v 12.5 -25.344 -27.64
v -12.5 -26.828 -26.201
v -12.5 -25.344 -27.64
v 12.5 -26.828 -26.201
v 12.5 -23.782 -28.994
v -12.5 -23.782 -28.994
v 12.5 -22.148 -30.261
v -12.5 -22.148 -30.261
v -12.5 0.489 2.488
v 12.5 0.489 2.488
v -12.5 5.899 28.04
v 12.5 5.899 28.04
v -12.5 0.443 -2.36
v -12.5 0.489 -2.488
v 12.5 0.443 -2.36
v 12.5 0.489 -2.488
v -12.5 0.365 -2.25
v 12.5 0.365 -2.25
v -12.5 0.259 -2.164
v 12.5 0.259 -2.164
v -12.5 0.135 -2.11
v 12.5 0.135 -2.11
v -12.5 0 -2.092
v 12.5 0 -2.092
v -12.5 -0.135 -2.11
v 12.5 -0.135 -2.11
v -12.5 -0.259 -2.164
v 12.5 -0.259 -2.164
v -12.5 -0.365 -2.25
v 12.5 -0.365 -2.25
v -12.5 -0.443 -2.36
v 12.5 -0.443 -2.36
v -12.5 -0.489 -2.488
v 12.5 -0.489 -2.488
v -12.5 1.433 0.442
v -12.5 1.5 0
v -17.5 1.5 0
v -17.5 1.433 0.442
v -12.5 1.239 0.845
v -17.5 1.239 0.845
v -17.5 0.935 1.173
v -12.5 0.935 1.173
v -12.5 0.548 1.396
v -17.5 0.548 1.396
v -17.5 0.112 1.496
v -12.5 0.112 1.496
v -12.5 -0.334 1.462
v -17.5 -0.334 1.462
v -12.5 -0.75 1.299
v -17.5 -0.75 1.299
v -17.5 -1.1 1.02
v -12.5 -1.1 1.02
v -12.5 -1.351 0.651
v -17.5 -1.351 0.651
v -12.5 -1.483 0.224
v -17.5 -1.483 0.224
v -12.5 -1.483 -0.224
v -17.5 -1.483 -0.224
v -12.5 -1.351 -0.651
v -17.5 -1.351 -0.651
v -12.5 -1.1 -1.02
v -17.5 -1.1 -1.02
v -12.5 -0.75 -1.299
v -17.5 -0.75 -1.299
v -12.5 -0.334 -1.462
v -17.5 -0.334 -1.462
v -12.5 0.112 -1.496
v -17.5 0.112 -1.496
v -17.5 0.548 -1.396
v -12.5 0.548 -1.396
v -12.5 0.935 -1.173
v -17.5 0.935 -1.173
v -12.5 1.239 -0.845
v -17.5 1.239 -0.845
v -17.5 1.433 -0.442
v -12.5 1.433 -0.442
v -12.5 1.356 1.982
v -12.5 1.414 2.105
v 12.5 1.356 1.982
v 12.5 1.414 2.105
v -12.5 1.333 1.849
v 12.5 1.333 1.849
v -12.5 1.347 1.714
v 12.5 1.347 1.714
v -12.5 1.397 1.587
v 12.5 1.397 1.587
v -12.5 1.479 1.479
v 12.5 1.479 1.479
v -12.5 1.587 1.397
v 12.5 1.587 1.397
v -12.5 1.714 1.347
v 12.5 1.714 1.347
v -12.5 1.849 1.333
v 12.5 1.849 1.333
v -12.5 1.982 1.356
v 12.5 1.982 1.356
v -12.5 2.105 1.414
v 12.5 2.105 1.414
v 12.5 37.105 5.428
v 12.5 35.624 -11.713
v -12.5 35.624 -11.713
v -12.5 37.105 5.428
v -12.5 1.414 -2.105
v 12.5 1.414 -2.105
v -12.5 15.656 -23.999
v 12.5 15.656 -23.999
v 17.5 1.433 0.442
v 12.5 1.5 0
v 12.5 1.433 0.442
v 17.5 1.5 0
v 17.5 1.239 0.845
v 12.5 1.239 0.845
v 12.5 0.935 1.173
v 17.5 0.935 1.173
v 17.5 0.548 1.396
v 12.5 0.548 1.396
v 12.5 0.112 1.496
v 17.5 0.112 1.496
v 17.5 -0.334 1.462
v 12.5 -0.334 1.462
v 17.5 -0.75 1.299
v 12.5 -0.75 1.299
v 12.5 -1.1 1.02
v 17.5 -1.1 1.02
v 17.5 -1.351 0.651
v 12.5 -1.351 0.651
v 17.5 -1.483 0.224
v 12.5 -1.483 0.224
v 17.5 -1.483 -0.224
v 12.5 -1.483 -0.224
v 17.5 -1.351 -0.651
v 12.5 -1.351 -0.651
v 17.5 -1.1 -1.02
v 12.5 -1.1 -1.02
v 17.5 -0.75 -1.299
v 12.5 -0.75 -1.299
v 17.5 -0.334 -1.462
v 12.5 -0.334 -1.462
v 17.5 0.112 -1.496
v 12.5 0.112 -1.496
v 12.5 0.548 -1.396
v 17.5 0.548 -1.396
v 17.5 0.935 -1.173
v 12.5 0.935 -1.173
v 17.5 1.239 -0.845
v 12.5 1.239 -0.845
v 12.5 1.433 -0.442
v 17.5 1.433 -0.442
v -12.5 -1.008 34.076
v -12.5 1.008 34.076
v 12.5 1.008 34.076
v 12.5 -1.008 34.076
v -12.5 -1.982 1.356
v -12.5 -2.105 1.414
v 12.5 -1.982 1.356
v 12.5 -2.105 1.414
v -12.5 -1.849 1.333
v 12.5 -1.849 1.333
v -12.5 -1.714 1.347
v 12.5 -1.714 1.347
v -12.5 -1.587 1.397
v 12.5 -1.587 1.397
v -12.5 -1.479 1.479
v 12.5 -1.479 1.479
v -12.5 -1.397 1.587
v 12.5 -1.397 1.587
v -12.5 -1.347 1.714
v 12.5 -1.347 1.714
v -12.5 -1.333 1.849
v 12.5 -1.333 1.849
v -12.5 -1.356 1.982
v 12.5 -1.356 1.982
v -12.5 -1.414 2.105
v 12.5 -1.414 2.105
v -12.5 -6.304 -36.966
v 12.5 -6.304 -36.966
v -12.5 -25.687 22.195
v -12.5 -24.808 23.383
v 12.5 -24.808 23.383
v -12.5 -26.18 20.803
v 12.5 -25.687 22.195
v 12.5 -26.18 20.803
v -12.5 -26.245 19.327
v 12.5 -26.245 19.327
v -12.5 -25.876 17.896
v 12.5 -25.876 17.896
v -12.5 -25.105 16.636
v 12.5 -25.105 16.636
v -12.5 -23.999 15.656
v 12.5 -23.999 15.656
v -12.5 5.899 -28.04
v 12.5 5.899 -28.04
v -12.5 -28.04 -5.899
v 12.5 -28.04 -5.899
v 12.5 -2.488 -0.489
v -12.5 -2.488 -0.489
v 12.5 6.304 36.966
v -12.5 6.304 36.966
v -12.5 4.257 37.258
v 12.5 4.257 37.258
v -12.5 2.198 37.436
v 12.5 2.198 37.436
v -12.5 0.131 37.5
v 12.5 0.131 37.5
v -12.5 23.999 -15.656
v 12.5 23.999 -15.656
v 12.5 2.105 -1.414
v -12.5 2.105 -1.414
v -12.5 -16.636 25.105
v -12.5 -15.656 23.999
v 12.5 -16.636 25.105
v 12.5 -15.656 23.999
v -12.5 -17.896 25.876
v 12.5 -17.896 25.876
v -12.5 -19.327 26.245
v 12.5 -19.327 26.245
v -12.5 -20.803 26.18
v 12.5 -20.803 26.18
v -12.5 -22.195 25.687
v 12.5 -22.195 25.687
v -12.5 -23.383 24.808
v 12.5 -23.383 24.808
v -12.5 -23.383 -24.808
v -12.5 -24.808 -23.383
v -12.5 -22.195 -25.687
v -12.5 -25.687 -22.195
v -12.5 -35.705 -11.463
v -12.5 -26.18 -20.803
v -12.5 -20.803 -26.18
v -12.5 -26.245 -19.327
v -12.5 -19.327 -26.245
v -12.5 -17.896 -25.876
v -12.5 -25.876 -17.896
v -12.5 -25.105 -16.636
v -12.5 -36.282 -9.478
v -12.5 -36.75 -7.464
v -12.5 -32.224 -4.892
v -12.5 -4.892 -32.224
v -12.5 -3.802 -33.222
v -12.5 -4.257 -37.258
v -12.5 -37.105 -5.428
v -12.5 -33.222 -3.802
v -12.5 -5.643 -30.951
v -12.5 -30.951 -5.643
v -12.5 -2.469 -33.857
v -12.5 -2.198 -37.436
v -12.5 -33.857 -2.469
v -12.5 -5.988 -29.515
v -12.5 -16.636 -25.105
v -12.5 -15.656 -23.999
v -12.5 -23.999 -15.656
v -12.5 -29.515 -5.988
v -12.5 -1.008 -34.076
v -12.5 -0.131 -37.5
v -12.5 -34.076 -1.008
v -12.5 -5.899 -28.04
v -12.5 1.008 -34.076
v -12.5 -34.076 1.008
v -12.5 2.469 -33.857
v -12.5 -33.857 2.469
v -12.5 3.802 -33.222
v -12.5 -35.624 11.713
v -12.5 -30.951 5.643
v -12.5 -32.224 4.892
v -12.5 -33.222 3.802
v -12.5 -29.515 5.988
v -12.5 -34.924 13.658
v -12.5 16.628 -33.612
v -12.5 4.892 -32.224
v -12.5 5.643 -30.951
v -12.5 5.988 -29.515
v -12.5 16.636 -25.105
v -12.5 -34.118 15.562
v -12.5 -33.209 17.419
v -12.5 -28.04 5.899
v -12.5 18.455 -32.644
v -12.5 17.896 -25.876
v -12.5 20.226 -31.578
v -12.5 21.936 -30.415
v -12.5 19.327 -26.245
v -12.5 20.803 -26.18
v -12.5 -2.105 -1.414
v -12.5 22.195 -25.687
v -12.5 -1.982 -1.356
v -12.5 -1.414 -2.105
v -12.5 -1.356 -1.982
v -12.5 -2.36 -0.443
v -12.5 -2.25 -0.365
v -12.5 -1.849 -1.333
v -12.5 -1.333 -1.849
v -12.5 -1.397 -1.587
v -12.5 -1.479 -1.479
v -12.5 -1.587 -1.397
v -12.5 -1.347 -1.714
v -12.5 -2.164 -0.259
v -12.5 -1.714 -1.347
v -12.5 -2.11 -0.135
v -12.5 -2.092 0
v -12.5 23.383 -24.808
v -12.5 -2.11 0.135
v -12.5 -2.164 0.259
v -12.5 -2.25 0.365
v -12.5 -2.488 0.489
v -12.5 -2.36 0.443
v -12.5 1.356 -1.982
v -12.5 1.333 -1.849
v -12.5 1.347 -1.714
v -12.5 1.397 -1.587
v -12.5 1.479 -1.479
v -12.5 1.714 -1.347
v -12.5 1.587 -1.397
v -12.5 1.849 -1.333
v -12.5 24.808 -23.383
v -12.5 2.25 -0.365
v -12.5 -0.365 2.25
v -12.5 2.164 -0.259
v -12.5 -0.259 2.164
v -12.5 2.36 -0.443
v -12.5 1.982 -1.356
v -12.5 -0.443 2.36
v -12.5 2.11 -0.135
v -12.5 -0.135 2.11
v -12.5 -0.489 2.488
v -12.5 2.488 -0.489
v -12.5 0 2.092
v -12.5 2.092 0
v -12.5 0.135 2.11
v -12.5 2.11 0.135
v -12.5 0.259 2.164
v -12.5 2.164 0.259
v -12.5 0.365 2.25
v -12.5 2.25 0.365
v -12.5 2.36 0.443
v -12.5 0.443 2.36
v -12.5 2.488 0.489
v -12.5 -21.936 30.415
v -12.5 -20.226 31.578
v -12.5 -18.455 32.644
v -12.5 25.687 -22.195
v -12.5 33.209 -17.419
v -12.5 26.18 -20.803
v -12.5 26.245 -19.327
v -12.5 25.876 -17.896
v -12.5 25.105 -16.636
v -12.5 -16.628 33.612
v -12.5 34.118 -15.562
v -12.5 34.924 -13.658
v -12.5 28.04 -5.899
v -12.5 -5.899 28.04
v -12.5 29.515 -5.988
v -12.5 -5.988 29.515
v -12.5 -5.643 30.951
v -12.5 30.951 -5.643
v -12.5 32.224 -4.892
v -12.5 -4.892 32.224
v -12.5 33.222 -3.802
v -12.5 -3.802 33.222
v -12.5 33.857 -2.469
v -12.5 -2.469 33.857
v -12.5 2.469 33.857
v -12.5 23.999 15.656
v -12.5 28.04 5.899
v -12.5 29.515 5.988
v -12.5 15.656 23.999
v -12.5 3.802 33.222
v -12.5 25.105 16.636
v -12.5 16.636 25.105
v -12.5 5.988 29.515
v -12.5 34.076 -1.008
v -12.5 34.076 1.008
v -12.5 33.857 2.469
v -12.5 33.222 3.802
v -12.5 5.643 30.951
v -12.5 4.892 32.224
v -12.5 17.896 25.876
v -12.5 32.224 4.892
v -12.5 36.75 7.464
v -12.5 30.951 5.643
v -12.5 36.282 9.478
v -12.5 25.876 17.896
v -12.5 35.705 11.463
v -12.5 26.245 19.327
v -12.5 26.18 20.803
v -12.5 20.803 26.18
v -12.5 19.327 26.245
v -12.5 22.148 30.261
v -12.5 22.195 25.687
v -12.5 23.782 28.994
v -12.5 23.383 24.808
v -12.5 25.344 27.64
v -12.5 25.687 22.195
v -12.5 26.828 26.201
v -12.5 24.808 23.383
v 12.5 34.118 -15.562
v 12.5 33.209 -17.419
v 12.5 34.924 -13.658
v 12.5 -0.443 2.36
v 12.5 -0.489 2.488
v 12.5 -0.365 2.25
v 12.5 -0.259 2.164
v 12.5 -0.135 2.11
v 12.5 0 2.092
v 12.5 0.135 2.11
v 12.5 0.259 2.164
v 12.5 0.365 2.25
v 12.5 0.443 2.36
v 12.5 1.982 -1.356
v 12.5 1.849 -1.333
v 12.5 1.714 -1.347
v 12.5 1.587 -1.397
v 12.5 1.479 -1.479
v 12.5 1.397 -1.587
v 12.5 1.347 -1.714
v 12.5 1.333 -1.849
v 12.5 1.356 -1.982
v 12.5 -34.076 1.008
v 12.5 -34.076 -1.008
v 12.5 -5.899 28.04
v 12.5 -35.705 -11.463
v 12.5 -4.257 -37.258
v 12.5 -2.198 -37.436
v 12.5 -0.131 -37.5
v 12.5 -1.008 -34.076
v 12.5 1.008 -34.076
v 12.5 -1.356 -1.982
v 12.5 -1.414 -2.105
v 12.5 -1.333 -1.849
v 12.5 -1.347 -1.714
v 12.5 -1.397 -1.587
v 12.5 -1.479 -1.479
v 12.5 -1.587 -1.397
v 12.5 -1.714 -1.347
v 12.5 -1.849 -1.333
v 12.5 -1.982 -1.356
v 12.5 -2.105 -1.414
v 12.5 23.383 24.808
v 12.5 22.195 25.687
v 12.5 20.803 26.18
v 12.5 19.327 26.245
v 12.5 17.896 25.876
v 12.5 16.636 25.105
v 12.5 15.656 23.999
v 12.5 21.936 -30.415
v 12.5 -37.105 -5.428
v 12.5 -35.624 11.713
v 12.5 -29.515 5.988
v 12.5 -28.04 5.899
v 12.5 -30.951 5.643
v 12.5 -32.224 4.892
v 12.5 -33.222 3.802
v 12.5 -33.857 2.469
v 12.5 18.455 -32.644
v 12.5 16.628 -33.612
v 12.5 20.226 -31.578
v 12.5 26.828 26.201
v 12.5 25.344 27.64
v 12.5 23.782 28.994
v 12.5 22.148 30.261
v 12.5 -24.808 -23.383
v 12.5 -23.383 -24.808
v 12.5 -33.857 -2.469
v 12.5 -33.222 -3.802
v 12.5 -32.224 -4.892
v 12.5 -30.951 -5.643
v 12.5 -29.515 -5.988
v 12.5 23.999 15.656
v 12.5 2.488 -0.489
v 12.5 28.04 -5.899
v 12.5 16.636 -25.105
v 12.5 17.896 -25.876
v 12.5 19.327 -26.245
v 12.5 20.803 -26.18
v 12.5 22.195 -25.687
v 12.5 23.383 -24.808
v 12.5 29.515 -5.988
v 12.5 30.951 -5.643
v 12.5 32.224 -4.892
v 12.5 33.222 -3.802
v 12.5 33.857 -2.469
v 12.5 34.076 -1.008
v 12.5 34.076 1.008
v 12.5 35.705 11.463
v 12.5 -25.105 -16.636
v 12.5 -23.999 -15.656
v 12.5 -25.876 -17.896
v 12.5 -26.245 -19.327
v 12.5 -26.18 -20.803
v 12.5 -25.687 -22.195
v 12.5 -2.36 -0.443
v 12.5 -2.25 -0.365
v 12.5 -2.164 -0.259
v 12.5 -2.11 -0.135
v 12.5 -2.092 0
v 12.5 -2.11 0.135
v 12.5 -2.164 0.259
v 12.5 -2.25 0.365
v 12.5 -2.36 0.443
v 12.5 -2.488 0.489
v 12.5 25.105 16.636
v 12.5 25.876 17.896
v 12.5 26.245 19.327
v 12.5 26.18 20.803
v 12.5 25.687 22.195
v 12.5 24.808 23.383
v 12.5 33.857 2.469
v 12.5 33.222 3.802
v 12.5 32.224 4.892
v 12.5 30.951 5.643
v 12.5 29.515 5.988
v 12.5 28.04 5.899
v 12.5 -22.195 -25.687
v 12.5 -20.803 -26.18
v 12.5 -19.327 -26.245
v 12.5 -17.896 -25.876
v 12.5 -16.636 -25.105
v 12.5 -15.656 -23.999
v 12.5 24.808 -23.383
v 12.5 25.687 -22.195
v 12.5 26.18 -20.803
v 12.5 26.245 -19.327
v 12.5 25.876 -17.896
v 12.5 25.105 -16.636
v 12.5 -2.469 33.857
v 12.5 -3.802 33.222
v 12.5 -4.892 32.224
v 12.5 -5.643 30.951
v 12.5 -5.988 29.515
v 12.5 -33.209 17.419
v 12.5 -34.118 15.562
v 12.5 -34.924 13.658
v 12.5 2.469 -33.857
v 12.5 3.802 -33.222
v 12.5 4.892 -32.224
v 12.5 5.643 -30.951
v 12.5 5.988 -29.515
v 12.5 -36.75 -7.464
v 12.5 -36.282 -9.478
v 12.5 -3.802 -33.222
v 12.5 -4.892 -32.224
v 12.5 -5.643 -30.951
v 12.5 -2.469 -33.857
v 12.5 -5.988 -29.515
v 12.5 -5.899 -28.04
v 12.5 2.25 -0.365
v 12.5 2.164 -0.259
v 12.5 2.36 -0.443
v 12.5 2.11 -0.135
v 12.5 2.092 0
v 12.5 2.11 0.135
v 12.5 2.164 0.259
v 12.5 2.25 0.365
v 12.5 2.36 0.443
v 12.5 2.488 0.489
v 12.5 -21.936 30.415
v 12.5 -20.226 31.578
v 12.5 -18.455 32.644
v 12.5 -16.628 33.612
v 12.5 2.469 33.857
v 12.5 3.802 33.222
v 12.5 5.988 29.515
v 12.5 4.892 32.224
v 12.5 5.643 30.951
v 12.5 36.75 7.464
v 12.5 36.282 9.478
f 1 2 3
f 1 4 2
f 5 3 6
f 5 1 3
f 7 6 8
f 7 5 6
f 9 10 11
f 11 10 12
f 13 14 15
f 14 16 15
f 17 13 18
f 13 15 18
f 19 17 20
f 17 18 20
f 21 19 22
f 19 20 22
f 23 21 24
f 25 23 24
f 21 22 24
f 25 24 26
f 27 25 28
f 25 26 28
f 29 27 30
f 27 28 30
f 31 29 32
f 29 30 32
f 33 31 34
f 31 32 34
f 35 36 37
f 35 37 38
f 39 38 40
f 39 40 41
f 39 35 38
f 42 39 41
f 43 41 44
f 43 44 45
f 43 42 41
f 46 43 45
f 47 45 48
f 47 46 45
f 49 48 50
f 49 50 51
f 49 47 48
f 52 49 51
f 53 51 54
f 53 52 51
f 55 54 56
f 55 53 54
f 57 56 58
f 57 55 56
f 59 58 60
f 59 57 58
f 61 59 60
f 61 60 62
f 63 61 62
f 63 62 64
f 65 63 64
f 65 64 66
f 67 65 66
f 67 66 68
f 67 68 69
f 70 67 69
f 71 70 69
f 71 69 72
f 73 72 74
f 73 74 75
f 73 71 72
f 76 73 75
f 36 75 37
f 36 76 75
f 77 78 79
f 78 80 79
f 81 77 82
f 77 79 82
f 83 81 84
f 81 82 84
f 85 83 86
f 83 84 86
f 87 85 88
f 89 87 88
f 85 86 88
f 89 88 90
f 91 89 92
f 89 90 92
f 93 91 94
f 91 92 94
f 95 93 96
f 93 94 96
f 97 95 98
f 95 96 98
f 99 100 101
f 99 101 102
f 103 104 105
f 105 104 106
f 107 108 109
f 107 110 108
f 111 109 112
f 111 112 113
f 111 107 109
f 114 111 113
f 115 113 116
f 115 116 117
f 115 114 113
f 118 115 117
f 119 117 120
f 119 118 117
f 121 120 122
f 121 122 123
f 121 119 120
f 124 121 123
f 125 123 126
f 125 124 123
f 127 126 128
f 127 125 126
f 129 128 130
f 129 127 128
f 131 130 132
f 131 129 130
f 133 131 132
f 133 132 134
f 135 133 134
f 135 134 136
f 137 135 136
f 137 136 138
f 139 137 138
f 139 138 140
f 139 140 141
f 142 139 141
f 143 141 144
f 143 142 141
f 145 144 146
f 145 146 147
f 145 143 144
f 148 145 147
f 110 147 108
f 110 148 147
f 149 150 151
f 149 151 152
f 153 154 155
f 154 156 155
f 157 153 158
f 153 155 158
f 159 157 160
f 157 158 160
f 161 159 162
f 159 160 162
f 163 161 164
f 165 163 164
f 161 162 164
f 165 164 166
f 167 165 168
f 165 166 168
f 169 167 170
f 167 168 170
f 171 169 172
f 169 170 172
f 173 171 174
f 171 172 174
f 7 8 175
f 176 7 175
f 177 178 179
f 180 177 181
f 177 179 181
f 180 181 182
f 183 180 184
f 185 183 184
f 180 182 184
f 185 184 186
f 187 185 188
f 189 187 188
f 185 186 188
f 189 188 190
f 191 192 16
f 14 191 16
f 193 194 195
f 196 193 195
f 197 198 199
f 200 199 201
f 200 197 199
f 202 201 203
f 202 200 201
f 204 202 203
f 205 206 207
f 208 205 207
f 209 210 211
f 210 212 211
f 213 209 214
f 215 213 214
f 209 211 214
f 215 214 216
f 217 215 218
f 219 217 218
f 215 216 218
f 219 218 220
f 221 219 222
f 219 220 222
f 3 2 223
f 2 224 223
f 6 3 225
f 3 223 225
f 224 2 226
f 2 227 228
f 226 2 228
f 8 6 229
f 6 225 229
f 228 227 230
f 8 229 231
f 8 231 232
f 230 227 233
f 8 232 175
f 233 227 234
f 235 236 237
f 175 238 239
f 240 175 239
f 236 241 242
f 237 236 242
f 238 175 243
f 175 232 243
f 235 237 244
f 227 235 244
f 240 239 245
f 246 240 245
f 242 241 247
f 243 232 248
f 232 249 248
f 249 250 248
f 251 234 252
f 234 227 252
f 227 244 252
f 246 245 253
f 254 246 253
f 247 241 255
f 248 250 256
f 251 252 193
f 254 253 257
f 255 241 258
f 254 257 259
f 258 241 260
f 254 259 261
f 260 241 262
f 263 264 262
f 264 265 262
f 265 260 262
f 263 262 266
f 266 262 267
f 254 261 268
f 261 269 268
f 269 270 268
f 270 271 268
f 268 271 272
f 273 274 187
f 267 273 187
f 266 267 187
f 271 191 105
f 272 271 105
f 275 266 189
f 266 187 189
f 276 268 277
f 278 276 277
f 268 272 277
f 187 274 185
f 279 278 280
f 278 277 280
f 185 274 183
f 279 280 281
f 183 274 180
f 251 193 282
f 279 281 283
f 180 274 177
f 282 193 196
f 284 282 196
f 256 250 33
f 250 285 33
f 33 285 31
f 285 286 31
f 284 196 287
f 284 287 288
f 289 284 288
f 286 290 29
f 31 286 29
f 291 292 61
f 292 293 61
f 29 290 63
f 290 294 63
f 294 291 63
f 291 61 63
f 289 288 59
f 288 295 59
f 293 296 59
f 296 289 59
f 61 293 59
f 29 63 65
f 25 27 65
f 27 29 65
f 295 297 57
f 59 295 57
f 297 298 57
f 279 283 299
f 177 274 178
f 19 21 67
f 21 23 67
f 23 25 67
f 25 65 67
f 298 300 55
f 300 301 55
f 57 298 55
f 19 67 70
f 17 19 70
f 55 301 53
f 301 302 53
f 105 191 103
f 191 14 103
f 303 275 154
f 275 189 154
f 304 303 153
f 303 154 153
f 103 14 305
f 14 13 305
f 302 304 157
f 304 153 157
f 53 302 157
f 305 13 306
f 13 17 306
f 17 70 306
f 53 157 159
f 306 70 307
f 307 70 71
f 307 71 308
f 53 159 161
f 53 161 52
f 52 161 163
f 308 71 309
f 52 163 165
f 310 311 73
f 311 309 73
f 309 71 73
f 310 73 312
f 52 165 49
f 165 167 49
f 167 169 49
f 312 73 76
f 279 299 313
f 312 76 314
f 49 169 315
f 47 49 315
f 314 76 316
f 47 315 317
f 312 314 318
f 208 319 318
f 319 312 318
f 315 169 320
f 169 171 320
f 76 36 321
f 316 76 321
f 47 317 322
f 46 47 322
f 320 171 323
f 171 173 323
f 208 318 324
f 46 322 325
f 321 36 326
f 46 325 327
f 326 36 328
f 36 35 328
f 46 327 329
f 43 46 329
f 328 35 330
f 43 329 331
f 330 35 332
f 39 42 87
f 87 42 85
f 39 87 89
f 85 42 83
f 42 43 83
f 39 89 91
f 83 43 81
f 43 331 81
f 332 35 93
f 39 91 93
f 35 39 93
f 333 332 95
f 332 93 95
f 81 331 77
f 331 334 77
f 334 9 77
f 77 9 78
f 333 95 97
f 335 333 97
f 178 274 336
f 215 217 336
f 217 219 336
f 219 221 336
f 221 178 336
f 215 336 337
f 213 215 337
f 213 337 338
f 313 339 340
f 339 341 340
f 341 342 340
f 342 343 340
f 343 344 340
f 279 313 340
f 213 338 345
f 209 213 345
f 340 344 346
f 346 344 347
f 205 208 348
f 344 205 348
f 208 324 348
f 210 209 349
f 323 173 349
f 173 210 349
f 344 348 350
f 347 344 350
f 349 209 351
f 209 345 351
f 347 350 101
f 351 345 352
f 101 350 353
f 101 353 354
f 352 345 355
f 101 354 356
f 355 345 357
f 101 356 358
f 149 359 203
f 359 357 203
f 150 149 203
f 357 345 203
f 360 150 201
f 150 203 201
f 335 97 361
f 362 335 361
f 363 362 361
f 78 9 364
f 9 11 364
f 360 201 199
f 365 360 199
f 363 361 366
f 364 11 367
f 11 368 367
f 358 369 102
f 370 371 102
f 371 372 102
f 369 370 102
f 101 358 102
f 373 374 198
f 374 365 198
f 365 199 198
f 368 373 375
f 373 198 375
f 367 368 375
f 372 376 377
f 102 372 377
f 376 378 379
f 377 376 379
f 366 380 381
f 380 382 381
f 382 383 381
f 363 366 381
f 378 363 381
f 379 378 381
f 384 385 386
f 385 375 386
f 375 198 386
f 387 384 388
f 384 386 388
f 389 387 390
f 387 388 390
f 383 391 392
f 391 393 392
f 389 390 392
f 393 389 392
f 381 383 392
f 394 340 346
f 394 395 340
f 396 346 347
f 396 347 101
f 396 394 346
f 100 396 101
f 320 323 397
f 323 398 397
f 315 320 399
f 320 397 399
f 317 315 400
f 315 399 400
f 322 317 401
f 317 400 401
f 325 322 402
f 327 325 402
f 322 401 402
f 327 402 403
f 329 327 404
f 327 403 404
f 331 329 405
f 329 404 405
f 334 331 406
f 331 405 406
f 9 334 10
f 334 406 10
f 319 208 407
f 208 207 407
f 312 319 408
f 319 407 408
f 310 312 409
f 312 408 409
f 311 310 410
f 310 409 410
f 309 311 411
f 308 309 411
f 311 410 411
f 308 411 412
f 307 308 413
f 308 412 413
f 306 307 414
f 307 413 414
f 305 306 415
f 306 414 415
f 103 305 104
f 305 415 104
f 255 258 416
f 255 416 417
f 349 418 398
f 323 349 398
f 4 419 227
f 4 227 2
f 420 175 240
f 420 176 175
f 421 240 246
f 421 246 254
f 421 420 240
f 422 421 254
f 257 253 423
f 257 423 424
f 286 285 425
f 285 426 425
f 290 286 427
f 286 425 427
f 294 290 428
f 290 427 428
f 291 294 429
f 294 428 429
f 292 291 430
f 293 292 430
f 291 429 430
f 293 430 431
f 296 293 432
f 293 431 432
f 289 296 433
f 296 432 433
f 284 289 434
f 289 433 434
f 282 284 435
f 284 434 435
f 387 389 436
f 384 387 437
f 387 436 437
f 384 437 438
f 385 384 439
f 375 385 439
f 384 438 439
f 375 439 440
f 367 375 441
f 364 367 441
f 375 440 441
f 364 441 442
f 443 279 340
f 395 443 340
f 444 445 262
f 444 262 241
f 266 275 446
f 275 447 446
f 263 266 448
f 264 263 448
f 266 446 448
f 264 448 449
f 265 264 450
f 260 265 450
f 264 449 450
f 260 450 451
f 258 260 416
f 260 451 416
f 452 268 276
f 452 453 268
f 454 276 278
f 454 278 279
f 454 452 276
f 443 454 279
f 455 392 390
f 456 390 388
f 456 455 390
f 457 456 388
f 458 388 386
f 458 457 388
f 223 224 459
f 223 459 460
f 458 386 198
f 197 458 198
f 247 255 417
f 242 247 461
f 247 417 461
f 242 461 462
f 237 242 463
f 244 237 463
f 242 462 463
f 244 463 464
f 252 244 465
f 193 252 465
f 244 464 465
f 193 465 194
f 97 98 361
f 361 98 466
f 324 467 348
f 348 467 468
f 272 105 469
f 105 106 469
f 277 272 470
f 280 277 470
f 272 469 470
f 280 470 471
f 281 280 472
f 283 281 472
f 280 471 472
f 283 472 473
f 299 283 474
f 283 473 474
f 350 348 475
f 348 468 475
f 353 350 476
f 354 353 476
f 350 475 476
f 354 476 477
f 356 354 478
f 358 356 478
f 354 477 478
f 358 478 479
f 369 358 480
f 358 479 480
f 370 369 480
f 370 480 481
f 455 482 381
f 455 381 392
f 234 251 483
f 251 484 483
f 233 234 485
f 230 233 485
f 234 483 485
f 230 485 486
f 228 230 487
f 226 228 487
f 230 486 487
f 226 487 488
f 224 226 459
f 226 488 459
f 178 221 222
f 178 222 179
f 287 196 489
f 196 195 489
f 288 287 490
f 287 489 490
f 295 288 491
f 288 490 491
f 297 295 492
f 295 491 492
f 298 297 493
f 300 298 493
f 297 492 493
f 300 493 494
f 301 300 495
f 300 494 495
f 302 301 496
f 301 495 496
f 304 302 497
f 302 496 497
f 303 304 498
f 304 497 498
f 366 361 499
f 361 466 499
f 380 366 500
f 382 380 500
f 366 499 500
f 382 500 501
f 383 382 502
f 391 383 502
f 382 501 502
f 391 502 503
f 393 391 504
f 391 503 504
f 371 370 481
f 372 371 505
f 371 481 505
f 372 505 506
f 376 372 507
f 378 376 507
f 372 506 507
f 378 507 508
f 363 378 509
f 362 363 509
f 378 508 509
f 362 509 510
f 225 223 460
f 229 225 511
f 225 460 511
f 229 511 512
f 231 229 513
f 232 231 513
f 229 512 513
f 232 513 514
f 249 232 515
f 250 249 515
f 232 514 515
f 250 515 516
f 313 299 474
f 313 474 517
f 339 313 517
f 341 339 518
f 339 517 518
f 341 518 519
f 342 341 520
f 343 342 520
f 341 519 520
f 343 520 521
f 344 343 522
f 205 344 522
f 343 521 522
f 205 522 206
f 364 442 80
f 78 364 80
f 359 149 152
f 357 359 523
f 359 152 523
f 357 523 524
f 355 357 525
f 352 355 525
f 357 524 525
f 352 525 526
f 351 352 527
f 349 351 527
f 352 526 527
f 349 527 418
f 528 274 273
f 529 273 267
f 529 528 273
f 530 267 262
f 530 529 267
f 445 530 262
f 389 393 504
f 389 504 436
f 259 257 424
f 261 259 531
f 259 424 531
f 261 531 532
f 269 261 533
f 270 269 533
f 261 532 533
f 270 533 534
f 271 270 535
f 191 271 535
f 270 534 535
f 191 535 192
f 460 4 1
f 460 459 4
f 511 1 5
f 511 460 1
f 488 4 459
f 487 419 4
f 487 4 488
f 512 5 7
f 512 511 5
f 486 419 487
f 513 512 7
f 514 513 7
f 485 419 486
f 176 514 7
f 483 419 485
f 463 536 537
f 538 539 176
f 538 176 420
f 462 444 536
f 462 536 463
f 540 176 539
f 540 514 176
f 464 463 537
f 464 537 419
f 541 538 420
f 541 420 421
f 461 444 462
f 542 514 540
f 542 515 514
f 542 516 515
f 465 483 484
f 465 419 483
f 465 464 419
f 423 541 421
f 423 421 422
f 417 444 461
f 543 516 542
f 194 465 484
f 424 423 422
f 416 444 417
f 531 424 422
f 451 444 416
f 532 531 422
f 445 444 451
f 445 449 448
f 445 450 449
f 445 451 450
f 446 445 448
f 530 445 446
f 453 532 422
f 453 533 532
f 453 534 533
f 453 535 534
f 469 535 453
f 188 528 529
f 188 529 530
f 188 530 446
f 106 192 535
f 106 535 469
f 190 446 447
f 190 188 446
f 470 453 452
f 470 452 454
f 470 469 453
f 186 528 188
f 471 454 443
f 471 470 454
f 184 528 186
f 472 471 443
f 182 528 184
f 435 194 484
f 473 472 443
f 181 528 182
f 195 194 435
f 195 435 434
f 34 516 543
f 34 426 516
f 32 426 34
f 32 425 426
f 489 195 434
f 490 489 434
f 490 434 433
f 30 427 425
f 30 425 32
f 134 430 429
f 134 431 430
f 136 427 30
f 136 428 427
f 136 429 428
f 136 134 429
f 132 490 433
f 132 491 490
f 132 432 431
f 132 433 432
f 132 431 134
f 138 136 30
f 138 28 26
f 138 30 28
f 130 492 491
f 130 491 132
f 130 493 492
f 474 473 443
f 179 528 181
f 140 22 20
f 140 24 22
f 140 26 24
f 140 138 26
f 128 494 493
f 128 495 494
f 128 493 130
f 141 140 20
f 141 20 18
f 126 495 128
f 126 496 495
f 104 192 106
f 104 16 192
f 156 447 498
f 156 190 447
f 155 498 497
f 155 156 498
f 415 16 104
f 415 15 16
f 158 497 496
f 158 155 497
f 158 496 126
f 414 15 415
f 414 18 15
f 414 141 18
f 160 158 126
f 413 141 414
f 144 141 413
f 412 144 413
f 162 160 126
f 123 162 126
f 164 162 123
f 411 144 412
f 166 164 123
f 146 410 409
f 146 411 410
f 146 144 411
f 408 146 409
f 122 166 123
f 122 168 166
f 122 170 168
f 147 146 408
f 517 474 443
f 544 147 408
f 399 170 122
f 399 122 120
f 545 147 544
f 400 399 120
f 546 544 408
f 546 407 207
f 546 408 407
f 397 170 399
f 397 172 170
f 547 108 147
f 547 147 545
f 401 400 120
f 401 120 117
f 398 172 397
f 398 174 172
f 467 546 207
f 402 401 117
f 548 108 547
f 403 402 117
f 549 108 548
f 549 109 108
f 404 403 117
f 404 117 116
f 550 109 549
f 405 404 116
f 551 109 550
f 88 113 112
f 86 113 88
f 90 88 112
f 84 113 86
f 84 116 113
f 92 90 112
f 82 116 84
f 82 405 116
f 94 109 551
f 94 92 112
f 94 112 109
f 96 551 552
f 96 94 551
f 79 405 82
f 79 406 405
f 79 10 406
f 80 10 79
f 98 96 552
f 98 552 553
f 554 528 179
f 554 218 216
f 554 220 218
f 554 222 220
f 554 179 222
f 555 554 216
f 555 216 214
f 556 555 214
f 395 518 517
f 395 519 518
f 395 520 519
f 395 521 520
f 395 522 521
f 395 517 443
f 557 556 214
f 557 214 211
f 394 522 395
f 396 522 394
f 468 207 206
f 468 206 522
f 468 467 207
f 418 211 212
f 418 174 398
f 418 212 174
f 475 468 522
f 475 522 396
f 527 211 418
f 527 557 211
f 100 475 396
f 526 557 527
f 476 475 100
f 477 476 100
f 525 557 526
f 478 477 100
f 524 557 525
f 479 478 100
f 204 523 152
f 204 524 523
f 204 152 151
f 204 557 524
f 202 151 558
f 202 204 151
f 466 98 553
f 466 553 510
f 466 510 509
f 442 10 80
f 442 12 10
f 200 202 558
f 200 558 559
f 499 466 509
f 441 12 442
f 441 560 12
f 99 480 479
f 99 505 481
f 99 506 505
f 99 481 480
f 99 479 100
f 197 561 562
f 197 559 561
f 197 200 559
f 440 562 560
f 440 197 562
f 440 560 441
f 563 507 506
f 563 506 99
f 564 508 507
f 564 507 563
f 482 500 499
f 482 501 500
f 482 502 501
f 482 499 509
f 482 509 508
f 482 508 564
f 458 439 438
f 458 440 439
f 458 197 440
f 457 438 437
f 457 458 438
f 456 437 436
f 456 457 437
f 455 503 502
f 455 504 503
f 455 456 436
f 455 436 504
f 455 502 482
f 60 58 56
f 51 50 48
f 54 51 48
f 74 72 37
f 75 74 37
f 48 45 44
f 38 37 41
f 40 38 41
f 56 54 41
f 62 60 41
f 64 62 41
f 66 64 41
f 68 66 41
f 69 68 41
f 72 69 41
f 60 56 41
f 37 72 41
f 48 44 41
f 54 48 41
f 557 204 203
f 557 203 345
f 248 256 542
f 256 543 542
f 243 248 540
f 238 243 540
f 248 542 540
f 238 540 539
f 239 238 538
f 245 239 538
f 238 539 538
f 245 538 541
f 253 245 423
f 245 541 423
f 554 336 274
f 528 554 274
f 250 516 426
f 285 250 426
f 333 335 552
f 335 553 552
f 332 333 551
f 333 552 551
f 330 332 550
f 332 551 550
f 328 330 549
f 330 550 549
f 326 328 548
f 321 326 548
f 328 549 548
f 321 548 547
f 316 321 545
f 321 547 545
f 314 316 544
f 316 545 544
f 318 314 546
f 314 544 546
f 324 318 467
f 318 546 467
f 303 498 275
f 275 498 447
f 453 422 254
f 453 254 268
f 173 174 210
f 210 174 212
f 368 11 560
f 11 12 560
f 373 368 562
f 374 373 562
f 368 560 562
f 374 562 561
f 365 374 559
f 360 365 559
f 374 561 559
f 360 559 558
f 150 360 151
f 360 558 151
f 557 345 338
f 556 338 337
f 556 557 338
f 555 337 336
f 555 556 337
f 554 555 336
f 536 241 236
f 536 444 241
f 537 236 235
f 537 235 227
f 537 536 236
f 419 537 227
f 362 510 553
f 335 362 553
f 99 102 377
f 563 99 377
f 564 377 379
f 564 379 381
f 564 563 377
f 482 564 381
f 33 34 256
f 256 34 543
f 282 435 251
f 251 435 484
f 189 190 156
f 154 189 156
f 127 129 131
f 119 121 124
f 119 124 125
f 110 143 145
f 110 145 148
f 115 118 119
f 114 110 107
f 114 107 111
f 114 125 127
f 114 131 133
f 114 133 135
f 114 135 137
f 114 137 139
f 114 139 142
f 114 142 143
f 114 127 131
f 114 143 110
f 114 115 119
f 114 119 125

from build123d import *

# Parameters (mm, degrees)
F0_R     = 37.5
F1_DEPTH = 12.5
F3_DEPTH = 12.5
F4_COUNT = 8
F6_DEPTH = 12.5
F7_R     = 1.5
F8_DEPTH = 17.5


with BuildPart() as f1:
    # F0 (on Right) → F1 (new body, symmetric)
    with BuildSketch(Plane.YZ):
        Circle(F0_R)
    extrude(amount=F1_DEPTH, both=True)

    # F2 (on Right) → F3 (cut, symmetric)
    with BuildSketch(Plane.YZ):
        with BuildLine():
            ThreePointArc((5.8991823905, 28.0400841101), (4.892101729, 32.223904361), (1.0076208802, 34.075760696))
            Line((1.0076208802, 34.075760696), (-1.0076208802, 34.075760696))
            ThreePointArc((-1.0076208802, 34.075760696), (-4.892101729, 32.223904361), (-5.8991823905, 28.0400841101))
            Line((-5.8991823905, 28.0400841101), (-0.489156151, 2.4882115641))
            ThreePointArc((-0.489156151, 2.4882115641), (0, 2.0917792227), (0.489156151, 2.4882115641))
            Line((0.489156151, 2.4882115641), (5.8991823905, 28.0400841101))
        make_face()
    f3 = extrude(amount=F3_DEPTH, both=True, mode=Mode.SUBTRACT)

    # F4: F3 ×8 about axis
    f4_axis = Axis((12.5, 0, 0), (1, 0, 0))
    for i in range(1, F4_COUNT):
        add(f3.rotate(f4_axis, i * 360 / F4_COUNT), mode=Mode.SUBTRACT)

    # F5 (on Right) → F6 (intersect, symmetric)
    with BuildSketch(Plane.YZ):
        Polygon((37.3855511828, 8.6729428424), (25.1477183542, 28.9912337848), (3.3043118538, 38.2358587972), (-19.8012294653, 32.8756853382), (-35.3433741477, 14.9581174833), (-37.3855511828, -8.6729428424), (-25.1477183542, -28.9912337848), (-3.3043118538, -38.2358587972), (19.8012294653, -32.8756853382), (35.3433741477, -14.9581174833), align=None)
    extrude(amount=F6_DEPTH, both=True, mode=Mode.INTERSECT)

    # F7 (on Right) → F8 (join, symmetric)
    with BuildSketch(Plane.YZ):
        Circle(F7_R)
    extrude(amount=F8_DEPTH, both=True)


solid = f1.part
